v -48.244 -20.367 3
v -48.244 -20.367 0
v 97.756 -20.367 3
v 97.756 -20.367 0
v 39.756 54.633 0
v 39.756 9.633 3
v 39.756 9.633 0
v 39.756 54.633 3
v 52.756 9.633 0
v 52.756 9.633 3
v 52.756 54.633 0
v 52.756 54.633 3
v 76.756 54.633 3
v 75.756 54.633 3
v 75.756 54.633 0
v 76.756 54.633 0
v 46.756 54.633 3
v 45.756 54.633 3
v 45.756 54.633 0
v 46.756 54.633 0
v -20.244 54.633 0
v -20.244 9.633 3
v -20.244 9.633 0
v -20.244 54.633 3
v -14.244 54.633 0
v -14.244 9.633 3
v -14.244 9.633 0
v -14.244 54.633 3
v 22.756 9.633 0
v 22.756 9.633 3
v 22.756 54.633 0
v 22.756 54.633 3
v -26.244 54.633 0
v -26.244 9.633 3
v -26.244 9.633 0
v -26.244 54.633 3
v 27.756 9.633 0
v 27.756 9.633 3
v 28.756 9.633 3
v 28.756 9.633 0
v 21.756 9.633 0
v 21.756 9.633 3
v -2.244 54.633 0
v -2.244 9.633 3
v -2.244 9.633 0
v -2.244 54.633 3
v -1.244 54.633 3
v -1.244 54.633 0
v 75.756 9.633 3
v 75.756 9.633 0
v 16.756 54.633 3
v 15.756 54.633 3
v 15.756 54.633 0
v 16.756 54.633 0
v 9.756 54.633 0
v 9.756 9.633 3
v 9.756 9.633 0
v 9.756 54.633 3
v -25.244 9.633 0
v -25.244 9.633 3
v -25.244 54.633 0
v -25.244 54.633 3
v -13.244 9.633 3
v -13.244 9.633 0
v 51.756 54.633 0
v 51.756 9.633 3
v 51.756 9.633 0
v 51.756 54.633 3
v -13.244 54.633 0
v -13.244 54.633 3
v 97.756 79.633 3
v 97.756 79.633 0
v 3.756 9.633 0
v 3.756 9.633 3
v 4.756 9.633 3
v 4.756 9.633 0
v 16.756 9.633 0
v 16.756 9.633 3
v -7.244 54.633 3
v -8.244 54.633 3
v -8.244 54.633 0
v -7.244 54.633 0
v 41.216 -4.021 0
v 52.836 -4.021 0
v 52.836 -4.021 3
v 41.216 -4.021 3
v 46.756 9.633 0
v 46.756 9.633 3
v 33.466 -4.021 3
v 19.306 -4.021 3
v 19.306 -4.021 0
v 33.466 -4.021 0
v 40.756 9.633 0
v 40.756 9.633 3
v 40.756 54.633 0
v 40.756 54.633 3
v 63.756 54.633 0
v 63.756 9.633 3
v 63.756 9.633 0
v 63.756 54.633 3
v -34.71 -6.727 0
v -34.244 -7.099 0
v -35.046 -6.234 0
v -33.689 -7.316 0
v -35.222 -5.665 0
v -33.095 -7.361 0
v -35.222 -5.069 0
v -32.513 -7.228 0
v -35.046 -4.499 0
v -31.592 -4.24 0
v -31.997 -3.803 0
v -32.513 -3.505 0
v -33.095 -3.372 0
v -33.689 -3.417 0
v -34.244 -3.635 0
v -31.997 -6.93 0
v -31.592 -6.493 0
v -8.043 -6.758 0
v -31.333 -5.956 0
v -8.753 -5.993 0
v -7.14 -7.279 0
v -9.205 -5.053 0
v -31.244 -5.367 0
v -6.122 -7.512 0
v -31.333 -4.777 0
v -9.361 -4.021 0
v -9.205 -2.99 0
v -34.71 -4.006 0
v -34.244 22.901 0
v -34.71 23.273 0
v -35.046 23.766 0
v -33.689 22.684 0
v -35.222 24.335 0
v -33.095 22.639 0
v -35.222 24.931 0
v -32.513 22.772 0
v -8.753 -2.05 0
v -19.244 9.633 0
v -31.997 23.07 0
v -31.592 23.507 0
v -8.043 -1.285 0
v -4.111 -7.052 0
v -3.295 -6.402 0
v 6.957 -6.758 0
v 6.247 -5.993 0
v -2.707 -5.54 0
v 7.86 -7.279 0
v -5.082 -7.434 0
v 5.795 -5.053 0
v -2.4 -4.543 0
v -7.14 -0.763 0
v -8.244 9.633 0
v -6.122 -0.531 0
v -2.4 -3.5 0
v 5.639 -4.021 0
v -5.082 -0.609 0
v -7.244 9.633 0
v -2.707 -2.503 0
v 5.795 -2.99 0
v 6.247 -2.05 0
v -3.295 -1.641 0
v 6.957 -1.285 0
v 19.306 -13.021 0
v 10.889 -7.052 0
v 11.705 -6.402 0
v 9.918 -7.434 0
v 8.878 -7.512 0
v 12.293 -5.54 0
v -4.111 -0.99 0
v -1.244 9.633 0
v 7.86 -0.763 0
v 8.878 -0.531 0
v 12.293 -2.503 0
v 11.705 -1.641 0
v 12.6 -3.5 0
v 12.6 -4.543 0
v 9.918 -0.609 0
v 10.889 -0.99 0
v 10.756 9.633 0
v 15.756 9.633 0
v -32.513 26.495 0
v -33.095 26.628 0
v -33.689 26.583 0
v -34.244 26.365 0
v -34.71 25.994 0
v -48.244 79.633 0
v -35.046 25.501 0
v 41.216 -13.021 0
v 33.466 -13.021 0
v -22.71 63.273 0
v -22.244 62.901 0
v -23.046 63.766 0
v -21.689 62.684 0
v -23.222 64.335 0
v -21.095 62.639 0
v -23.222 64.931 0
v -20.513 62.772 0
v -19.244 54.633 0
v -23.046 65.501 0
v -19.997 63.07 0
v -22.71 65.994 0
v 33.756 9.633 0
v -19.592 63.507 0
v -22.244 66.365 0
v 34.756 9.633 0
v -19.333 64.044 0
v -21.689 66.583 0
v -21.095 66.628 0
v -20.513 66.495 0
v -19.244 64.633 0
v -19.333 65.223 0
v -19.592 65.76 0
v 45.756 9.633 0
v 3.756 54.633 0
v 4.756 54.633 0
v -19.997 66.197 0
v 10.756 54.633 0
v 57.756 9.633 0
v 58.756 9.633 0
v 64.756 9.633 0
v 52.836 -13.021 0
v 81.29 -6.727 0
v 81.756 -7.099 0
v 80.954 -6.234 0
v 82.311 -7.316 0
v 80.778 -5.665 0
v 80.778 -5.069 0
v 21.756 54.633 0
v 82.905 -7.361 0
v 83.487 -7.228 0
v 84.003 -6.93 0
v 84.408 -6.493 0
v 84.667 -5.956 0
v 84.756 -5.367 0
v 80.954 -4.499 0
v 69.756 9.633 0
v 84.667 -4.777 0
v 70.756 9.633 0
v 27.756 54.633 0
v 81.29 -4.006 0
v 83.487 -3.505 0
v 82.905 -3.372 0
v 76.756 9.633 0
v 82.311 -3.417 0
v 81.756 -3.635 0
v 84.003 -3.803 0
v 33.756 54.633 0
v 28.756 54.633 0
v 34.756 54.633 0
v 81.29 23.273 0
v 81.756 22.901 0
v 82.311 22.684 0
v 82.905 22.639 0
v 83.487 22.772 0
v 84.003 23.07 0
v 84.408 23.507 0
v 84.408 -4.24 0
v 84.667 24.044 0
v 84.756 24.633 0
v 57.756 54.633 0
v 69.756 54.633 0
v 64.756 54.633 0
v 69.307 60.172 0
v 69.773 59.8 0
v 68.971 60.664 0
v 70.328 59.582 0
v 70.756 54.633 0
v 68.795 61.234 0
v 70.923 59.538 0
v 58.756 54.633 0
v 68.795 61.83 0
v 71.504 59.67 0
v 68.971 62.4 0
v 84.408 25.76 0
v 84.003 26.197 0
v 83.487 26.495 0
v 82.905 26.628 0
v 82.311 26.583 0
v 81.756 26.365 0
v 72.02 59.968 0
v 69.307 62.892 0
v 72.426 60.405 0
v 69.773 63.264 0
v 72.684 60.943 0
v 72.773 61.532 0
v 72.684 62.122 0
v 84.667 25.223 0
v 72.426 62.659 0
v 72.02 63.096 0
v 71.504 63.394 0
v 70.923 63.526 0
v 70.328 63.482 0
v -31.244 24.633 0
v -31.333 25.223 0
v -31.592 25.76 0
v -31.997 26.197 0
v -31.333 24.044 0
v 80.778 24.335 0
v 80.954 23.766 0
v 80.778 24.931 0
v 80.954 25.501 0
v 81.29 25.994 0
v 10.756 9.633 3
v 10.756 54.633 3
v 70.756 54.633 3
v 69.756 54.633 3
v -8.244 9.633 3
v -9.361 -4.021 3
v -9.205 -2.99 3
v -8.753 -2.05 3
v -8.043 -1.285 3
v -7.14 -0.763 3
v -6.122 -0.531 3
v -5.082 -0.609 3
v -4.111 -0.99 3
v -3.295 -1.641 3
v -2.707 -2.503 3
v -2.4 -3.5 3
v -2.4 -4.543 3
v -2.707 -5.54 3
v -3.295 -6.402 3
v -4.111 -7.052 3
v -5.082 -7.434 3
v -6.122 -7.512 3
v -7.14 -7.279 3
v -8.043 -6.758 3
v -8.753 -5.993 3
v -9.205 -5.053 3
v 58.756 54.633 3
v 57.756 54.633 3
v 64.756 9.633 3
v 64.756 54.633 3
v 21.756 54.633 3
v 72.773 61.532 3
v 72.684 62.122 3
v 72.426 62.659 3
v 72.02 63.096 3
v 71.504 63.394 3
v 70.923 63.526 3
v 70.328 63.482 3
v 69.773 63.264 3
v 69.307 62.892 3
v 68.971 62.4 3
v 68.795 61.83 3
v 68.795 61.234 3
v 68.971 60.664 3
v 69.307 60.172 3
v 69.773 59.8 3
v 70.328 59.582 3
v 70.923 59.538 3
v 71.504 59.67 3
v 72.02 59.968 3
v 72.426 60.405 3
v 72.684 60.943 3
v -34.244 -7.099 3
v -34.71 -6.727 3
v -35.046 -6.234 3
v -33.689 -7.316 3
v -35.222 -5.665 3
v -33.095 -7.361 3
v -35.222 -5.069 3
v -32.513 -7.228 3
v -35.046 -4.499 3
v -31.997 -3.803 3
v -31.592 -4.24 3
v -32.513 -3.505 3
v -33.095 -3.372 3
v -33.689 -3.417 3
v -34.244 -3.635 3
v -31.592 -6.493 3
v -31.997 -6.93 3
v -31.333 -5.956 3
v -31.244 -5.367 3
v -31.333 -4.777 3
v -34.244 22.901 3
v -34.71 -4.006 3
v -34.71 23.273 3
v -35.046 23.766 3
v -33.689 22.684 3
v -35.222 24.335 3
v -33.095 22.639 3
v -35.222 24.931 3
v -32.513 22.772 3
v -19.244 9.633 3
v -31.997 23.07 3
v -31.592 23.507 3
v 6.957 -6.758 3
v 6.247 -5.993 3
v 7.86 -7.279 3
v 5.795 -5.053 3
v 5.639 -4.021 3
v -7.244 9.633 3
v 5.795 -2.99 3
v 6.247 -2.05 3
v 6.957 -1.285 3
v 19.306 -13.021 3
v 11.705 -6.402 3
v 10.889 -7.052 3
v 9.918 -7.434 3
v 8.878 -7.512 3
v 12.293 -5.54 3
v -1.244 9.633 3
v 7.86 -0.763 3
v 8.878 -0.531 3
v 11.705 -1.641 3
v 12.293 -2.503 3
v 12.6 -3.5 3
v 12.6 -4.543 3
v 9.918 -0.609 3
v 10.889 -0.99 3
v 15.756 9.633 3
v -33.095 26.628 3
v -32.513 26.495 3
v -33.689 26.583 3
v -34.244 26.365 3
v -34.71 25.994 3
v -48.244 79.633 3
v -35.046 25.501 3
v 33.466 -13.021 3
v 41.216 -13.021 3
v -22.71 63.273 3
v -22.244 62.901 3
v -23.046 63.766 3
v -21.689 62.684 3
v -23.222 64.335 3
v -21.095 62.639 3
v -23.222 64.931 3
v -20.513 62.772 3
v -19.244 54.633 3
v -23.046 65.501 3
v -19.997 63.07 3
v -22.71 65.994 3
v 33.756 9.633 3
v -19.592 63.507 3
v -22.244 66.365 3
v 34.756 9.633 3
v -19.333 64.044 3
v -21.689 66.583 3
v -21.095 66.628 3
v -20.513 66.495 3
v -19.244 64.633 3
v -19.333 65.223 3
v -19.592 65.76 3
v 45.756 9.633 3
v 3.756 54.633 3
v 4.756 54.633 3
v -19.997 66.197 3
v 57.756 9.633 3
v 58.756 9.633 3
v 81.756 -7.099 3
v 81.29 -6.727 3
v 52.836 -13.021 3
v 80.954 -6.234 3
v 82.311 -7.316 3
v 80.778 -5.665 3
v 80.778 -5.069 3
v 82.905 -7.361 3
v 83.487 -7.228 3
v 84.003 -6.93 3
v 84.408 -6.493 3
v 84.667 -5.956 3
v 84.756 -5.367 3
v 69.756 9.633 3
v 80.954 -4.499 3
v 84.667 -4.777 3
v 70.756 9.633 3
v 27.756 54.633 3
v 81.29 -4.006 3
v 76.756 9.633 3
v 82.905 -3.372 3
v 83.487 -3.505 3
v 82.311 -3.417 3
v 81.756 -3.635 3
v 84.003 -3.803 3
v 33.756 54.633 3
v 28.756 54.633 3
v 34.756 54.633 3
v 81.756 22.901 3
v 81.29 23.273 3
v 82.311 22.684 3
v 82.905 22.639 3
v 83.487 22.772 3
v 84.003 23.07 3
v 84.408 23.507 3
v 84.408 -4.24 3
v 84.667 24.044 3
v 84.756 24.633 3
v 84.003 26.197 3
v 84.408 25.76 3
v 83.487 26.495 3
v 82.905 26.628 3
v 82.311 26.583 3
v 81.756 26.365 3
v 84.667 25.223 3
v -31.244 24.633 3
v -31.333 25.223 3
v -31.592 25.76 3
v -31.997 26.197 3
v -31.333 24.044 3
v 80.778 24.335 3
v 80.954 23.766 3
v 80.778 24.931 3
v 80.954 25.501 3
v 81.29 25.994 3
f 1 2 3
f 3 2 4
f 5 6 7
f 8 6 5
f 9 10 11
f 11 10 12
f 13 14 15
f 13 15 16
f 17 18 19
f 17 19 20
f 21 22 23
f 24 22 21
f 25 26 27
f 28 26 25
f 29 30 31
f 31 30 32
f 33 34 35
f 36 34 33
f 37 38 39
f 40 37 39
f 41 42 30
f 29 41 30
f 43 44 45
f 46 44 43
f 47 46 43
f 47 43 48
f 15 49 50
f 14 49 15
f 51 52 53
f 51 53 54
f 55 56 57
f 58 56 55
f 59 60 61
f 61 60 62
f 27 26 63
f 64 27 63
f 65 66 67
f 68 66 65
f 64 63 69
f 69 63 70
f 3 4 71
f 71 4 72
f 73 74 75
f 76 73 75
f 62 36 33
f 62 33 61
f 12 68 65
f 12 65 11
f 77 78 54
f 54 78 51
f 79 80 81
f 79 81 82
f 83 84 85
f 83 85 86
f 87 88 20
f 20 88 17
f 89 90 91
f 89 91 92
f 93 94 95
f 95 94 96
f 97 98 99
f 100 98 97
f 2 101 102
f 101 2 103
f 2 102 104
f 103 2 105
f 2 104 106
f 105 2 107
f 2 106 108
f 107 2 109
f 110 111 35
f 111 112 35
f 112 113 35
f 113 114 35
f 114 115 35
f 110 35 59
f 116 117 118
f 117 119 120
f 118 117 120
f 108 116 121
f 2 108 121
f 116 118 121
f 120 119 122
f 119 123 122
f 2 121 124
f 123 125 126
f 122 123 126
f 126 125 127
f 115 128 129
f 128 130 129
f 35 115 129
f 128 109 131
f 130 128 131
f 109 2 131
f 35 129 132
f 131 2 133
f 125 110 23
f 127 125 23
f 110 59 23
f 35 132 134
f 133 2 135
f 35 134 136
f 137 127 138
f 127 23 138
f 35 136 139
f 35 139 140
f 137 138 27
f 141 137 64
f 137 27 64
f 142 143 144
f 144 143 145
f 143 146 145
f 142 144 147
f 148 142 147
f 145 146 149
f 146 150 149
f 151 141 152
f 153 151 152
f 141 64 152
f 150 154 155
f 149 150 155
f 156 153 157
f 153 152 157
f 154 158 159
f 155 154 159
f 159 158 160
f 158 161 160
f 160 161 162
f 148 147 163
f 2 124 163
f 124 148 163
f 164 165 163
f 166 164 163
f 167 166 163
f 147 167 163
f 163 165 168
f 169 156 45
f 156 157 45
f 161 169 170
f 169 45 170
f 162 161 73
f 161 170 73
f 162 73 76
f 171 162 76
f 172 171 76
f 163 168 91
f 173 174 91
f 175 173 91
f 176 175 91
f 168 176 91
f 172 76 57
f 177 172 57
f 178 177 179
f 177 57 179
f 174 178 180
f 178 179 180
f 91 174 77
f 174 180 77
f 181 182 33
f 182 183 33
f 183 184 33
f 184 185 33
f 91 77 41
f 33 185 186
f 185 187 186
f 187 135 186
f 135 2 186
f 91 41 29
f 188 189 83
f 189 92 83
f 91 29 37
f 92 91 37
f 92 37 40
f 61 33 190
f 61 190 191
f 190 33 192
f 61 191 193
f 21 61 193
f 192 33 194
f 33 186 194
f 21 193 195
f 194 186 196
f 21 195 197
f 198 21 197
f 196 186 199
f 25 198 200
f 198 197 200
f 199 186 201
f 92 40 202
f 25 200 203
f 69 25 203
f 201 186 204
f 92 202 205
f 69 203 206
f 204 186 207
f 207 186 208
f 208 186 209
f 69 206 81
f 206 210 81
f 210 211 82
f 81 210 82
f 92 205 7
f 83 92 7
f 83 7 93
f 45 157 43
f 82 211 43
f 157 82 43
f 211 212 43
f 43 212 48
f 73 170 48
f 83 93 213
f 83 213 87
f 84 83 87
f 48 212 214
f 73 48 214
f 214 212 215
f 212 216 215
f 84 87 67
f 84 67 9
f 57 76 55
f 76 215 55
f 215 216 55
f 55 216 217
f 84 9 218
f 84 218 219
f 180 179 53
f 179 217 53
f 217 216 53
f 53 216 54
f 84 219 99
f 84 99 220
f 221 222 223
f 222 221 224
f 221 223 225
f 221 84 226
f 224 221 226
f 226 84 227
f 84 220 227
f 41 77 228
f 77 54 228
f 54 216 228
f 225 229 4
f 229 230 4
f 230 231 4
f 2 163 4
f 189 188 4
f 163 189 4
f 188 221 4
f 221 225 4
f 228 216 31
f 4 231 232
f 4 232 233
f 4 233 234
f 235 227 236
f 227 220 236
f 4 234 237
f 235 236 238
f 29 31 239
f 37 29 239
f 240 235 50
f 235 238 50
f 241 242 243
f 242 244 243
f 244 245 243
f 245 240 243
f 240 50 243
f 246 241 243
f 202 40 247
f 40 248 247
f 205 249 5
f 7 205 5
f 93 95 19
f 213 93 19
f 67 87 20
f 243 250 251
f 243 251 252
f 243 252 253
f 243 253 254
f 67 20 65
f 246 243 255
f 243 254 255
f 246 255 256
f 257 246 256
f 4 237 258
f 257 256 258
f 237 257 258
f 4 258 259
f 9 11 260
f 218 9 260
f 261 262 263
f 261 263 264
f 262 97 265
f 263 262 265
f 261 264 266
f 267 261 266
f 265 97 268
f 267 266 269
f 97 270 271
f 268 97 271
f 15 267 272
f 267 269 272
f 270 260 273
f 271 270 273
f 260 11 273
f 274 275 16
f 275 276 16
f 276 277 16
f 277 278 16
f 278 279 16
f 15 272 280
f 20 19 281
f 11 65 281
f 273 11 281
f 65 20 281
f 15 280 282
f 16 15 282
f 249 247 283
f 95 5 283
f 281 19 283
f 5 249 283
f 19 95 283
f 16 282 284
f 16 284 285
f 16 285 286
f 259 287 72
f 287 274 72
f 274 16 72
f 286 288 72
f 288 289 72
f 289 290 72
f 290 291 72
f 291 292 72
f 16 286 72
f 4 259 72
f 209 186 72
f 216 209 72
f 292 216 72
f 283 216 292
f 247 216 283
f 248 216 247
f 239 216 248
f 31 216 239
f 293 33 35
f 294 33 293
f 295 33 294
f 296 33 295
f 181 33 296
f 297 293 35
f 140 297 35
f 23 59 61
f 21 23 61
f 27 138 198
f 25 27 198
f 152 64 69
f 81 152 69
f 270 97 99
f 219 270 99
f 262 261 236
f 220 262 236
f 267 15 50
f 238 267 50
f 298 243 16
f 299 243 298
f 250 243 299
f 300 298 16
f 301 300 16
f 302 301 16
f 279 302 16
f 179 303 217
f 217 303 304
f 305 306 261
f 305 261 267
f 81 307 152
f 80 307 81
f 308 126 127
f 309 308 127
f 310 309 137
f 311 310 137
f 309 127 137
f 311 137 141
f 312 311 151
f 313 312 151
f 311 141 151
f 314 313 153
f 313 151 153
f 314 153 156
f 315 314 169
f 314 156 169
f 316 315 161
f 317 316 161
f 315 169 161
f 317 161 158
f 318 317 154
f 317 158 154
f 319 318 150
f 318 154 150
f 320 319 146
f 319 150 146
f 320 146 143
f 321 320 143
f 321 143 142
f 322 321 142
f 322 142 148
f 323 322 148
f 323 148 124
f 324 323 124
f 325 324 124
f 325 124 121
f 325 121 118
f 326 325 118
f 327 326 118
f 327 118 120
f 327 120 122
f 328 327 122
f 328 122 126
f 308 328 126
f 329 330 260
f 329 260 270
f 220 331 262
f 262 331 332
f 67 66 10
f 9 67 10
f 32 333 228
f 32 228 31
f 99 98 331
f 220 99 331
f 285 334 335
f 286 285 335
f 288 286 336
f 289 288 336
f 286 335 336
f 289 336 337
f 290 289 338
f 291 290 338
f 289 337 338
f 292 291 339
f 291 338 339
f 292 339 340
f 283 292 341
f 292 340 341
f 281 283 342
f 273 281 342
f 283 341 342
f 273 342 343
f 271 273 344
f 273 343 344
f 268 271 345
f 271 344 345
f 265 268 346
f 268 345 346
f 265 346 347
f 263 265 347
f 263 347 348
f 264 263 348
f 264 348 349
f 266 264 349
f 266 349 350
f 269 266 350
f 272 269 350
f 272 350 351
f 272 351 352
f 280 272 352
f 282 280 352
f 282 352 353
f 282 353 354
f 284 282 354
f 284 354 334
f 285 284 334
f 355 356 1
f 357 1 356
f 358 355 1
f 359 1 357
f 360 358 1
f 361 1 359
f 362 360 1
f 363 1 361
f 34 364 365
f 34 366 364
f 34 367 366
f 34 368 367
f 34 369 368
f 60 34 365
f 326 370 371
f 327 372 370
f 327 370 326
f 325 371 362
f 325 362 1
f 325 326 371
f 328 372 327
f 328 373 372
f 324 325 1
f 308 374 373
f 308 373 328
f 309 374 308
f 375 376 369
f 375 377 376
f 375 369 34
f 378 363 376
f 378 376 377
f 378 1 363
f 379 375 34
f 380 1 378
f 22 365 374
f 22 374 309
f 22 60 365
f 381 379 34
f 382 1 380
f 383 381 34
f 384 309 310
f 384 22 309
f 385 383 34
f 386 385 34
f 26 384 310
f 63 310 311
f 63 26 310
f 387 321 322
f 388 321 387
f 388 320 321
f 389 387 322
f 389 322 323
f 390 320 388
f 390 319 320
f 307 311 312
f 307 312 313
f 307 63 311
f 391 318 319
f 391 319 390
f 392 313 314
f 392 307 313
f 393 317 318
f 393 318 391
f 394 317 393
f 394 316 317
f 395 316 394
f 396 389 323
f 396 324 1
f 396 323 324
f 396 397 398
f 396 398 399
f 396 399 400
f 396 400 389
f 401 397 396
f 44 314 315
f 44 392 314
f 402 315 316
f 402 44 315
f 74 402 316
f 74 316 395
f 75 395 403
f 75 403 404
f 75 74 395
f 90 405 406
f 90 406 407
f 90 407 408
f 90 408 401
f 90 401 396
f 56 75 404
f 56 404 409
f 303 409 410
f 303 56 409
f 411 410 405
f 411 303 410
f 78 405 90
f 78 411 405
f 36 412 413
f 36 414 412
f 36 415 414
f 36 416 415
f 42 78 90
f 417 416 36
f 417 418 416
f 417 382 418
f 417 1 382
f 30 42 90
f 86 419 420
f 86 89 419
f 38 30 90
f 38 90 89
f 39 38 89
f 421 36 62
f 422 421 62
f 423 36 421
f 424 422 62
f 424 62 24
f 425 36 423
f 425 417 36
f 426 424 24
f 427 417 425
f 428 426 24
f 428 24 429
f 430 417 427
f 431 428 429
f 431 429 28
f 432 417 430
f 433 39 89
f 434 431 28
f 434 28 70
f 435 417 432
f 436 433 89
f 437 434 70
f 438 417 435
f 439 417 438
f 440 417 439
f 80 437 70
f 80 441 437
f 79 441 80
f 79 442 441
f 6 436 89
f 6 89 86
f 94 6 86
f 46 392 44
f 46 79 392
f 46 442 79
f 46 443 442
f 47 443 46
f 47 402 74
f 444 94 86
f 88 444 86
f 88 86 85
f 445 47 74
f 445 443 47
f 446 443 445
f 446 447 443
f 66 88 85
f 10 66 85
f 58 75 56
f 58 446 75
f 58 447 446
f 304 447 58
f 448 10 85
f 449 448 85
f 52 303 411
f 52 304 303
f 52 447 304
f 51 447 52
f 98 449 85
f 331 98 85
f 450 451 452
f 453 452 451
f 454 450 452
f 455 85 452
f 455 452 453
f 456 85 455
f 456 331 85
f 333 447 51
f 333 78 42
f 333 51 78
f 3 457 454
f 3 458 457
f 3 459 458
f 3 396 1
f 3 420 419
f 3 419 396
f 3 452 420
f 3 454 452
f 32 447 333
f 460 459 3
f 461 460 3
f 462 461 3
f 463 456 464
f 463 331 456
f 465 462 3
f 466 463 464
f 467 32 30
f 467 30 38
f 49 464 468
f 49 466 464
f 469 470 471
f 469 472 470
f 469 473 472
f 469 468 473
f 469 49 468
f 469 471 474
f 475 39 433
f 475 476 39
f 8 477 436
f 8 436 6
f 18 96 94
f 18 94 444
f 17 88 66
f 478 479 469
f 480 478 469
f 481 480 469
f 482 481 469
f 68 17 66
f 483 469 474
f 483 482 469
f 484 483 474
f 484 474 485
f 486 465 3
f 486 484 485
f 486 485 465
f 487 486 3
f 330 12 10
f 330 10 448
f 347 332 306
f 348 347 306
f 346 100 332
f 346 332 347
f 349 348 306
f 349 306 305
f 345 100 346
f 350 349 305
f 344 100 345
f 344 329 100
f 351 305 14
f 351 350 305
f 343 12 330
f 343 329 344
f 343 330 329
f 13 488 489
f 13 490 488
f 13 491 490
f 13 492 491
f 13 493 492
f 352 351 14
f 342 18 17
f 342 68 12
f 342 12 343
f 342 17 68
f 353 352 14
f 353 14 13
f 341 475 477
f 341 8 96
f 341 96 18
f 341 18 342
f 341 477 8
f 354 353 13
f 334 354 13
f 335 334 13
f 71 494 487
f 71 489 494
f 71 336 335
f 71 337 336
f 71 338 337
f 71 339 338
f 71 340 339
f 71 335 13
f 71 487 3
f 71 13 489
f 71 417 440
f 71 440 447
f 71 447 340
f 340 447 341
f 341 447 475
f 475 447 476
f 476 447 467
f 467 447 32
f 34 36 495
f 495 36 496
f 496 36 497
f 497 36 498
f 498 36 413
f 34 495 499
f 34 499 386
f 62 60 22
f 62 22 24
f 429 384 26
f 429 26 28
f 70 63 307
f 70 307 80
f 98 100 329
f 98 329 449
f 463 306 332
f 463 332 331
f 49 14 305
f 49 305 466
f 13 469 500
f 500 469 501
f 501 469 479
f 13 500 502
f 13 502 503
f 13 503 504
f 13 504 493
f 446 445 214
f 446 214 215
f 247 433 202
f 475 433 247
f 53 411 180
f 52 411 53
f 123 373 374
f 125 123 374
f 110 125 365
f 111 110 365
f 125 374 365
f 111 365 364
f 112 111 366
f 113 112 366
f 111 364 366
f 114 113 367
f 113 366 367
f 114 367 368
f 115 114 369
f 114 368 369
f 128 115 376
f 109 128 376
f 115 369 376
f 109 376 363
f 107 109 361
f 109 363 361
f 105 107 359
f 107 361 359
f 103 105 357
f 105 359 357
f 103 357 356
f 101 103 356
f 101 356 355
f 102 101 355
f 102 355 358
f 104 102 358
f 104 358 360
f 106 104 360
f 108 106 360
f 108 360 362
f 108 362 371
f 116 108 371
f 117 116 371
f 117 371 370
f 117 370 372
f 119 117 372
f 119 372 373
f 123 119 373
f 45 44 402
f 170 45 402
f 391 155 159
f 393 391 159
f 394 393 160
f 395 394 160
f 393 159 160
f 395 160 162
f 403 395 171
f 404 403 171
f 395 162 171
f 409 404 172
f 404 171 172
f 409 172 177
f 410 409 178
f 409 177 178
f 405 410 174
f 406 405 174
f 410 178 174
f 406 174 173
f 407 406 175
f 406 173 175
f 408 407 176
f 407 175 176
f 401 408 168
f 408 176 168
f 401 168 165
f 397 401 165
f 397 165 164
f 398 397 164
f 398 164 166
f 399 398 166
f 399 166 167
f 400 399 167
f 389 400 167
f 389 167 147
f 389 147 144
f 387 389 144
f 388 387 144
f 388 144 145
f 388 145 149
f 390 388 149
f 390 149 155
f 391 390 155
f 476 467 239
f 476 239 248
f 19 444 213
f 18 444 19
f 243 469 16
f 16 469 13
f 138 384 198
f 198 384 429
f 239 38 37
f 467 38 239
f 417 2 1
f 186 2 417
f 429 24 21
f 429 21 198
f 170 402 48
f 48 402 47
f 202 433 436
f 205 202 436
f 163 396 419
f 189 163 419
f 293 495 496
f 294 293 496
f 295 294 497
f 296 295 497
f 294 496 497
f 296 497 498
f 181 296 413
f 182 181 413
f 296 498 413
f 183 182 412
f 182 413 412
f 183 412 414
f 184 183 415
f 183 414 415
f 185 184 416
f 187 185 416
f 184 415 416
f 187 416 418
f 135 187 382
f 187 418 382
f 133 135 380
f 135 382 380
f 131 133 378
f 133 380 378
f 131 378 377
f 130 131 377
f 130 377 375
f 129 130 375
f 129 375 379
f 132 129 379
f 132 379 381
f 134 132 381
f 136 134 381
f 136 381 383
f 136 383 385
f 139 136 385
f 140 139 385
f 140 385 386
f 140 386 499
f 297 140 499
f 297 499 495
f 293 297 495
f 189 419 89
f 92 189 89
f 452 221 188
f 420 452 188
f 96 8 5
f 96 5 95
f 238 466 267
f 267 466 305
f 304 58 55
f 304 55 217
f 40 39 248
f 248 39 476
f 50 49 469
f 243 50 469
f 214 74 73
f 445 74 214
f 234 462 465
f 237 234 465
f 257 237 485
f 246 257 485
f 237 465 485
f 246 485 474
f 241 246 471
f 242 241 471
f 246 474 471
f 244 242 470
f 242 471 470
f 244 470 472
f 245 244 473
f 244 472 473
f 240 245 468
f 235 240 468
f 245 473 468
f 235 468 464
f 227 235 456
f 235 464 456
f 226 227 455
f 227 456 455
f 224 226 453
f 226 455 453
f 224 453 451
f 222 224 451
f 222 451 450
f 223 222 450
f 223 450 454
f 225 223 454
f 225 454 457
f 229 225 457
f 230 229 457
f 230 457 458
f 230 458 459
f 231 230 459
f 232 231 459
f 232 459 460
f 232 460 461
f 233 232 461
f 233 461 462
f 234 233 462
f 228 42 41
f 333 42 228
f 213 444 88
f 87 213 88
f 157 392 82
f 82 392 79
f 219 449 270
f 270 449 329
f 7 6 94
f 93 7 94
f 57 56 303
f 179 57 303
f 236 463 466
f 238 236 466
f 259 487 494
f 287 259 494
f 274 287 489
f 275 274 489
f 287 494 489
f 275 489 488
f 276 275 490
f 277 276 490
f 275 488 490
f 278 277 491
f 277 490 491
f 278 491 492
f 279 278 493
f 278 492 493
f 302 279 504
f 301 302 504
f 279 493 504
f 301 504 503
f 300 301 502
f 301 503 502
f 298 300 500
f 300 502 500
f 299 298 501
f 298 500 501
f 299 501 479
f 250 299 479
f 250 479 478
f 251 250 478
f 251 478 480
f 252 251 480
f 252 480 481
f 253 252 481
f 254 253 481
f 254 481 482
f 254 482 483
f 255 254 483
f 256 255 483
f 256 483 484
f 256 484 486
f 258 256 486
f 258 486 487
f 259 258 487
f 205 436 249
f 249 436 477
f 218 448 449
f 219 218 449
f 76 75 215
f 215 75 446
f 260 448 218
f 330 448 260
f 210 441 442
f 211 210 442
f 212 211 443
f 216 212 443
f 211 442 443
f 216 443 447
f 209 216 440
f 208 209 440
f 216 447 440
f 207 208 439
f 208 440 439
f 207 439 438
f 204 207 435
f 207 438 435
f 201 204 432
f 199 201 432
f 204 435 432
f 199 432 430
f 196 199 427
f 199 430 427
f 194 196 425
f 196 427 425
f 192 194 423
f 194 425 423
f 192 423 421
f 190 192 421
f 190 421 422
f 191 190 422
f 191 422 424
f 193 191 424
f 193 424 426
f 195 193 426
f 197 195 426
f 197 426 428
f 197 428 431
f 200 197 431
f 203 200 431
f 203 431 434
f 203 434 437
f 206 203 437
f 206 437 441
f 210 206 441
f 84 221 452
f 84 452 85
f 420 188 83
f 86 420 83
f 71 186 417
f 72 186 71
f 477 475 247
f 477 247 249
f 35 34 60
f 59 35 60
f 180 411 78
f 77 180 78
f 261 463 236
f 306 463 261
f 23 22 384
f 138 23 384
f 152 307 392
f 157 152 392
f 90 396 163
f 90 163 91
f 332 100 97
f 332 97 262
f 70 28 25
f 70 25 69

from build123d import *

# Parameters (mm, degrees)
SKETCH1_W           = 146
SKETCH1_H           = 100
BOSS_EXTRUDE1_DEPTH = 3
SKETCH2_W           = 1
SKETCH2_H           = 45
CUT_EXTRUDE1_DEPTH  = 4
SKETCH3_R           = 2
CUT_EXTRUDE2_DEPTH  = 4
SKETCH4_W           = 11.62
SKETCH4_H           = 9
CUT_EXTRUDE3_DEPTH  = 4
SKETCH5_W           = 14.16
SKETCH5_H           = 9
CUT_EXTRUDE4_DEPTH  = 4
SKETCH6_R           = 3.5
CUT_EXTRUDE5_DEPTH  = 4
SKETCH8_R           = 2
CUT_EXTRUDE6_DEPTH  = 4
SKETCH9_R           = 2
CUT_EXTRUDE7_DEPTH  = 4


with BuildPart() as part:
    # Sketch1 → Boss-Extrude1 (new body)
    with BuildSketch(Plane.XY):
        with Locations((24.755849622, 29.633412311)):
            Rectangle(SKETCH1_W, SKETCH1_H)
    extrude(amount=BOSS_EXTRUDE1_DEPTH)

    # Sketch2 → Cut-Extrude1 (cut, through all)
    with BuildSketch(Plane.XY.offset(3)):
        with Locations((-19.744150378, 32.133412311)):
            Rectangle(SKETCH2_W, SKETCH2_H)
        with Locations((-25.744150378, 32.133412311)):
            Rectangle(SKETCH2_W, SKETCH2_H)
        with Locations((-13.744150378, 32.133412311)):
            Rectangle(SKETCH2_W, SKETCH2_H)
        with Locations((-7.744150378, 32.133412311)):
            Rectangle(SKETCH2_W, SKETCH2_H)
        with Locations((-1.744150378, 32.133412311)):
            Rectangle(SKETCH2_W, SKETCH2_H)
        with Locations((4.255849622, 32.133412311)):
            Rectangle(SKETCH2_W, SKETCH2_H)
        with Locations((10.255849622, 32.133412311)):
            Rectangle(SKETCH2_W, SKETCH2_H)
        with Locations((16.255849622, 32.133412311)):
            Rectangle(SKETCH2_W, SKETCH2_H)
        with Locations((22.255849622, 32.133412311)):
            Rectangle(SKETCH2_W, SKETCH2_H)
        with Locations((34.255849622, 32.133412311)):
            Rectangle(SKETCH2_W, SKETCH2_H)
        with Locations((28.255849622, 32.133412311)):
            Rectangle(SKETCH2_W, SKETCH2_H)
        with Locations((40.255849622, 32.133412311)):
            Rectangle(SKETCH2_W, SKETCH2_H)
        with Locations((46.255849622, 32.133412311)):
            Rectangle(SKETCH2_W, SKETCH2_H)
        with Locations((52.255849622, 32.133412311)):
            Rectangle(SKETCH2_W, SKETCH2_H)
        with Locations((58.255849622, 32.133412311)):
            Rectangle(SKETCH2_W, SKETCH2_H)
        with Locations((64.255849622, 32.133412311)):
            Rectangle(SKETCH2_W, SKETCH2_H)
        with Locations((70.255849622, 32.133412311)):
            Rectangle(SKETCH2_W, SKETCH2_H)
        with Locations((76.255849622, 32.133412311)):
            Rectangle(SKETCH2_W, SKETCH2_H)
    extrude(amount=-CUT_EXTRUDE1_DEPTH, mode=Mode.SUBTRACT)

    # Sketch3 → Cut-Extrude2 (cut, through all)
    with BuildSketch(Plane.XY.offset(3)):
        with Locations((-33.244150378, -5.366587689)):
            Circle(SKETCH3_R)
        with Locations((82.755849622, -5.366587689)):
            Circle(SKETCH3_R)
    extrude(amount=-CUT_EXTRUDE2_DEPTH, mode=Mode.SUBTRACT)

    # Sketch4 → Cut-Extrude3 (cut, through all)
    with BuildSketch(Plane(origin=(0, 0, 0), x_dir=(-1, 0, 0), z_dir=(0, 0, -1))):
        with Locations((-47.025849622, -8.521305626)):
            Rectangle(SKETCH4_W, SKETCH4_H)
    extrude(amount=-CUT_EXTRUDE3_DEPTH, mode=Mode.SUBTRACT)

    # Sketch5 → Cut-Extrude4 (cut, through all)
    with BuildSketch(Plane.XY.offset(3)):
        with Locations((26.385849622, -8.521305626)):
            Rectangle(SKETCH5_W, SKETCH5_H)
    extrude(amount=-CUT_EXTRUDE4_DEPTH, mode=Mode.SUBTRACT)

    # Sketch6 → Cut-Extrude5 (cut, through all)
    with BuildSketch(Plane(origin=(0, 0, 0), x_dir=(-1, 0, 0), z_dir=(0, 0, -1))):
        with Locations((-9.139177798, -4.021305626)):
            Circle(SKETCH6_R)
        with Locations((5.860822202, -4.021305626)):
            Circle(SKETCH6_R)
    extrude(amount=-CUT_EXTRUDE5_DEPTH, mode=Mode.SUBTRACT)

    # Sketch8 → Cut-Extrude6 (cut, through all)
    with BuildSketch(Plane.XY.offset(3)):
        with Locations((82.755849622, 24.633412311)):
            Circle(SKETCH8_R)
        with Locations((-33.244150378, 24.633412311)):
            Circle(SKETCH8_R)
    extrude(amount=-CUT_EXTRUDE6_DEPTH, mode=Mode.SUBTRACT)

    # Sketch9 → Cut-Extrude7 (cut, through all)
    with BuildSketch(Plane.XY.offset(3)):
        with Locations((-21.244150378, 64.633412311)):
            Circle(SKETCH9_R)
        with Locations((70.77306316, 61.532054099)):
            Circle(SKETCH9_R)
    extrude(amount=-CUT_EXTRUDE7_DEPTH, mode=Mode.SUBTRACT)


solid = part.part
